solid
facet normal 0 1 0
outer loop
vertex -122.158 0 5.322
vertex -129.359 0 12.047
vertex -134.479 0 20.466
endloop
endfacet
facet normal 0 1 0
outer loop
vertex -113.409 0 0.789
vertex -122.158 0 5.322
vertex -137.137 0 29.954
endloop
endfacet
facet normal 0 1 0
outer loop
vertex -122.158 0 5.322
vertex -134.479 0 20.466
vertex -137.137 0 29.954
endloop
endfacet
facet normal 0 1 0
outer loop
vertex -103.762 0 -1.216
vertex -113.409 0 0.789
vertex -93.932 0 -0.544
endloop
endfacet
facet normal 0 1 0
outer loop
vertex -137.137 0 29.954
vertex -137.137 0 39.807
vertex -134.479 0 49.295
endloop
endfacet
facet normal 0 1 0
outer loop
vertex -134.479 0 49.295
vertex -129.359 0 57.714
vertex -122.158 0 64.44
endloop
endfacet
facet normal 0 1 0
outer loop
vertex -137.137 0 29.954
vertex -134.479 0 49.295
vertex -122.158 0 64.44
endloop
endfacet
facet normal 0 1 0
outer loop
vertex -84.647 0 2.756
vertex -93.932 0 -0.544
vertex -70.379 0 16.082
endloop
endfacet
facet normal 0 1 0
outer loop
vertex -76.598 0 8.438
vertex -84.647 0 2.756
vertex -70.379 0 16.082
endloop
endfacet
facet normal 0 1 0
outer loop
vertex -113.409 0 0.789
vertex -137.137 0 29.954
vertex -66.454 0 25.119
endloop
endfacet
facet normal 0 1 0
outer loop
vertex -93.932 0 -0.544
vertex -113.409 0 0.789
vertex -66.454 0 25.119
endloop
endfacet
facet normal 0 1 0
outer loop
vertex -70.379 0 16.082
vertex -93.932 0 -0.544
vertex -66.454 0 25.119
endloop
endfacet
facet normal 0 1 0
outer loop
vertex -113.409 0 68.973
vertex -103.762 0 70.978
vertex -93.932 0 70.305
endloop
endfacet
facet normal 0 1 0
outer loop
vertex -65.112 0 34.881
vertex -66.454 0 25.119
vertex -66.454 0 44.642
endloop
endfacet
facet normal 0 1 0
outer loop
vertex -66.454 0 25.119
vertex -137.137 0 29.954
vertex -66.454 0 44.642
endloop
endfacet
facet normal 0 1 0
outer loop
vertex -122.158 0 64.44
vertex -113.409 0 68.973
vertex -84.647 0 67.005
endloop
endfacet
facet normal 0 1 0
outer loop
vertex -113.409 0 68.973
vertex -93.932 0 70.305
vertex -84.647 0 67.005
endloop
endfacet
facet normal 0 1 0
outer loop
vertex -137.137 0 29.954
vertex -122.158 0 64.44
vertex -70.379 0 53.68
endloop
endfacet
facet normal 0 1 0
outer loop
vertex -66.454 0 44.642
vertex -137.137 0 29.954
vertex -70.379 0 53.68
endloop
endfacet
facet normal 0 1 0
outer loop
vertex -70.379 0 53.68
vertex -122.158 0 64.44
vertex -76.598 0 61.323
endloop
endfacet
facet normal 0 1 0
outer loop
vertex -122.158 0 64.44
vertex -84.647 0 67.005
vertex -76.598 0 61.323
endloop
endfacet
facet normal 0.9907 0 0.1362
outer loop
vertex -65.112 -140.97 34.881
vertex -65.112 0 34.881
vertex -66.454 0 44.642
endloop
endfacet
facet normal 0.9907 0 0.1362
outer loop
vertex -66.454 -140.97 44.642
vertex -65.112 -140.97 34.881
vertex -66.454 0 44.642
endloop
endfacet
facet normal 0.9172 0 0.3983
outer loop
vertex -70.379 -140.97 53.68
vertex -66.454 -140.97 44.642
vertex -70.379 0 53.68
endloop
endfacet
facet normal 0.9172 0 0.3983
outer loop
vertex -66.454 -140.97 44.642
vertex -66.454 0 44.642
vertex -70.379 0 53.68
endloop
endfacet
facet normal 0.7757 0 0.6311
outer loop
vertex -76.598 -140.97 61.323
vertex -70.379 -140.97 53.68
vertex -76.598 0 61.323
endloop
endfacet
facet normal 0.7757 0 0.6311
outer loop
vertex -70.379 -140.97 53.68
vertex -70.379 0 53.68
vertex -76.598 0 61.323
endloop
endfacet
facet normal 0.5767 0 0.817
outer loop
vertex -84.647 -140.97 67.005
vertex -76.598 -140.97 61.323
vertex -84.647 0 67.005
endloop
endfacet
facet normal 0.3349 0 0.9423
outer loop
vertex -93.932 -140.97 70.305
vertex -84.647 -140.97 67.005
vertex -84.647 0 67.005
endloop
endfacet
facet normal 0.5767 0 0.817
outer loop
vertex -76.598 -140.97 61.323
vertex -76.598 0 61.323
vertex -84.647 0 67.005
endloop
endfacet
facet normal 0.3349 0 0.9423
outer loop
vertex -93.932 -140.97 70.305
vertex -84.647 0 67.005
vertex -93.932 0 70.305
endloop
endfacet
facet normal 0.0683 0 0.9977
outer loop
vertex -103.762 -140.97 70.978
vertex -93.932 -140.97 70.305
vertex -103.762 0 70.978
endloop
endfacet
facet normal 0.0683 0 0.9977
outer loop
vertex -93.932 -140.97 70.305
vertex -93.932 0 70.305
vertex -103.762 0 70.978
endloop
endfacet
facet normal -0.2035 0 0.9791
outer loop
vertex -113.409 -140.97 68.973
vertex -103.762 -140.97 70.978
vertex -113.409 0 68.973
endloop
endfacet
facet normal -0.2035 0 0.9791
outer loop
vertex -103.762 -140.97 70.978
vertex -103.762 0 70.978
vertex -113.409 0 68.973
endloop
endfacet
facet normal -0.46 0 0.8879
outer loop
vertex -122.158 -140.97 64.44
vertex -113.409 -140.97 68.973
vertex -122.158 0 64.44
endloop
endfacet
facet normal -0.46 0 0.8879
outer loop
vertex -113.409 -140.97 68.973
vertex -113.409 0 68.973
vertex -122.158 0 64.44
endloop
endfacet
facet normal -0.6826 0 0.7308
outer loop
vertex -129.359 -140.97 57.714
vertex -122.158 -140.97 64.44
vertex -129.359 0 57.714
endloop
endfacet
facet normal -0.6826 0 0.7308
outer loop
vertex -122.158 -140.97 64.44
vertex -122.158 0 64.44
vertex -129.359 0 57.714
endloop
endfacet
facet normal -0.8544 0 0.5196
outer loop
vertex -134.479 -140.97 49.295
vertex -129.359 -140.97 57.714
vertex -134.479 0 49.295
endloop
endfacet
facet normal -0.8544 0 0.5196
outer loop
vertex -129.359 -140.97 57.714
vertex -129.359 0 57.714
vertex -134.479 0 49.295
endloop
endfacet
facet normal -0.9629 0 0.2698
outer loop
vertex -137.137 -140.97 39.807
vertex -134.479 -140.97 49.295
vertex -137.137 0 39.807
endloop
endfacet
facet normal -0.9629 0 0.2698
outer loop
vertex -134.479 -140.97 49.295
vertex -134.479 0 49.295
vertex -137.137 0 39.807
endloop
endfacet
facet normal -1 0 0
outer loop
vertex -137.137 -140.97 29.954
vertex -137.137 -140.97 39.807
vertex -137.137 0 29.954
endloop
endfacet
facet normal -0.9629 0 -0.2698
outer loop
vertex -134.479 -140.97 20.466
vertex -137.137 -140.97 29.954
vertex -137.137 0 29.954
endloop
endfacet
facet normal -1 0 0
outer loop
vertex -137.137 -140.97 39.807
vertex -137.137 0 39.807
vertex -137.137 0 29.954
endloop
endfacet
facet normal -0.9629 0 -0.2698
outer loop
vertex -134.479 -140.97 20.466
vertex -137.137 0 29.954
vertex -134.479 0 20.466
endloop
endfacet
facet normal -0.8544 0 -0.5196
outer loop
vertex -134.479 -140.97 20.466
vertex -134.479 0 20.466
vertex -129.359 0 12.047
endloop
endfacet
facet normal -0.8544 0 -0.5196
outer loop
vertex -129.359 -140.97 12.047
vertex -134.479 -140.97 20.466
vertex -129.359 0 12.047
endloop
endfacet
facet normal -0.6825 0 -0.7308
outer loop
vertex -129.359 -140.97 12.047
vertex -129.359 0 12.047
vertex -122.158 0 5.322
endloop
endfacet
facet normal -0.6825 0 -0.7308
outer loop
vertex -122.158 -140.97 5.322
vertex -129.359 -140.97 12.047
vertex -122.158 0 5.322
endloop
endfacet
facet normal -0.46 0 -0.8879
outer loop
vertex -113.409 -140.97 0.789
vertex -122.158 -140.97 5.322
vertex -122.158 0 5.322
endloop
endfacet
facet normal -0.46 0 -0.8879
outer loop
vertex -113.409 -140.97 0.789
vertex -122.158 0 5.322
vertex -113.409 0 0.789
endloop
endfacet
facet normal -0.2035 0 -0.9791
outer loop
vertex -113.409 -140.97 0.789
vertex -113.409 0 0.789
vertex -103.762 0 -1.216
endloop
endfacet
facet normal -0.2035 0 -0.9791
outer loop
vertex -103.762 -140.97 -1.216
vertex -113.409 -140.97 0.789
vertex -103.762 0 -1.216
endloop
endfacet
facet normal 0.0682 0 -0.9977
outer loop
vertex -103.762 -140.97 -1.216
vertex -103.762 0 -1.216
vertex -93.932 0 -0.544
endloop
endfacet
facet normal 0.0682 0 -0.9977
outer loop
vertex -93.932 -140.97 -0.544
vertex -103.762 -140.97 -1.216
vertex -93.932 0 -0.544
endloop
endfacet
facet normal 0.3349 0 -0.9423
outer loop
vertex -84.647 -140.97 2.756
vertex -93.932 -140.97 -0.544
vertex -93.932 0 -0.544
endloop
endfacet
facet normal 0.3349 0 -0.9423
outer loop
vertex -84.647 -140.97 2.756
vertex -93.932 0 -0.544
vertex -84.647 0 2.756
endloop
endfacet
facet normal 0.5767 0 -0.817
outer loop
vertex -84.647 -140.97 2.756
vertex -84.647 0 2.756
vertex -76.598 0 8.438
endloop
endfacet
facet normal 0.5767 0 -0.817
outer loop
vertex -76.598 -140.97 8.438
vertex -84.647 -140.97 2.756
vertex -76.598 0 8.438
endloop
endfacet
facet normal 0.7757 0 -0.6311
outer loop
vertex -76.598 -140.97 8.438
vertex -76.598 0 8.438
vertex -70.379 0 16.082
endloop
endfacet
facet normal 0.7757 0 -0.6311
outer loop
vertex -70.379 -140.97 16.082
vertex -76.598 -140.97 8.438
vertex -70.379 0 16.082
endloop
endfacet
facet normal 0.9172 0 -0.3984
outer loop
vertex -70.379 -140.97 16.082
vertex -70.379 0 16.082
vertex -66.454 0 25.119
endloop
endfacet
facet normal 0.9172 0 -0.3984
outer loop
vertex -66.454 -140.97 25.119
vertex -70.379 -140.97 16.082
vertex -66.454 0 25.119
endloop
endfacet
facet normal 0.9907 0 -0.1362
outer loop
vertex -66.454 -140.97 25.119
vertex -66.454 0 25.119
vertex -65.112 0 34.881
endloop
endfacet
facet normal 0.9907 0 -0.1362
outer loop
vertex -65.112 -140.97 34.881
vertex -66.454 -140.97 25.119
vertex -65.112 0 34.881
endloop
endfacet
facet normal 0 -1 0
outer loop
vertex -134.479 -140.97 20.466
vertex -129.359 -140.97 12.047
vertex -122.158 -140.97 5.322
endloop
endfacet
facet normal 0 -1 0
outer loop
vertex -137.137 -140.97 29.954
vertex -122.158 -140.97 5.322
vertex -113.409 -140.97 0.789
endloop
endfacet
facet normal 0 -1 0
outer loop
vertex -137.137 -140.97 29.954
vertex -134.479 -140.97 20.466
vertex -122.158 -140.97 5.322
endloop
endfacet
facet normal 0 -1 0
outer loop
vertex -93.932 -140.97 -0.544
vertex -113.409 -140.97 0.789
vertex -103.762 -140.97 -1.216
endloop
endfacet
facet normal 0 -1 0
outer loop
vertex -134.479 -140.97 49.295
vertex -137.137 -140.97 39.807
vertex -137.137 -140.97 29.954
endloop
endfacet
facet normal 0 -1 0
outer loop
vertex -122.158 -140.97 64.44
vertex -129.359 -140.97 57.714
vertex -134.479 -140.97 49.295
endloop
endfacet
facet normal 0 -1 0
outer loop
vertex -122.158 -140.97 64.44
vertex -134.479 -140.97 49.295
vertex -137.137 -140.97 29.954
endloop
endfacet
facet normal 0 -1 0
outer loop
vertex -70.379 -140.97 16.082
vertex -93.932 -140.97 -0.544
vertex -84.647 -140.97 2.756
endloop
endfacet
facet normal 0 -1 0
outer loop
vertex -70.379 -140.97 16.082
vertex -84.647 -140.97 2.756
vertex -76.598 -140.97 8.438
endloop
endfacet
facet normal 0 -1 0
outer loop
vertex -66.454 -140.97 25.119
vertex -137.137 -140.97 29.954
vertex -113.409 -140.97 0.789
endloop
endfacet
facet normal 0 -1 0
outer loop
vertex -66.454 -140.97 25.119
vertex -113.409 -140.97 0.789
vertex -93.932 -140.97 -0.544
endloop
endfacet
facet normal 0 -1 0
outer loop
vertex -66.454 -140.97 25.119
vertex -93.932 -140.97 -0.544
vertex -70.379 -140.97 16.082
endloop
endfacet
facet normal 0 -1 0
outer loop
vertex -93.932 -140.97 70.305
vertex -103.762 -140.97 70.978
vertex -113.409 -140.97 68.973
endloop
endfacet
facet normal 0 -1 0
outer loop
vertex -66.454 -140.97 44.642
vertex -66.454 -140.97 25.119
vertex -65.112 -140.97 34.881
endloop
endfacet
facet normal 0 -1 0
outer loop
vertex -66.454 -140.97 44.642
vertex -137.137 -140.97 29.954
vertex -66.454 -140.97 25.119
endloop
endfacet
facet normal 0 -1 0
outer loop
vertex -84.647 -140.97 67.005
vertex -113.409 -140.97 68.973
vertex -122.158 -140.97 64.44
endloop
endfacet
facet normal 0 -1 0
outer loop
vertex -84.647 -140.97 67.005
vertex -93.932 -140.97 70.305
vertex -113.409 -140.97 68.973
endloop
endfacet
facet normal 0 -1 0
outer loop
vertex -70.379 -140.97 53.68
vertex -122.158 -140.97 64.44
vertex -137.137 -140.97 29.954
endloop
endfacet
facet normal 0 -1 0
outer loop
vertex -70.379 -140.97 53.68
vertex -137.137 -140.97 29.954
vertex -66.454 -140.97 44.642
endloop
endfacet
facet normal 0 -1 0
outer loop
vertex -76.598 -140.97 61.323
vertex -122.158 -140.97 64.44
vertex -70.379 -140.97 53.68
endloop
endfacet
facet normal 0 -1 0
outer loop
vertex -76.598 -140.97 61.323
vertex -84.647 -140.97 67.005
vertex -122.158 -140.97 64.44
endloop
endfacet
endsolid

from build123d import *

# Parameters (mm, degrees)
F0_R     = 36.1810919244
F1_DEPTH = 25.4
F2_DEPTH = 25.4
F3_DEPTH = 90.17


with BuildPart() as f1:
    # F0 (on Front) → F1 (new body)
    with BuildSketch(Plane.XZ):
        with Locations((-101.2930572033, 34.8807759583)):
            Circle(F0_R)
    extrude(amount=F1_DEPTH)

    # F2 (add): faces of the model
    f2_faces = [f1.faces().sort_by_distance(p)[0] for p in [
        (-101.2930572033, -25.4, 34.8807759583),
        (-101.2930572033, 0, 34.8807759583),
    ]]
    extrude(f2_faces, amount=F2_DEPTH, dir=(0, -1, 0))

    # F3 (add): faces of the model
    f3_faces = [f1.faces().sort_by_distance(p)[0] for p in [
        (-101.2930572033, -50.8, 34.8807759583),
        (-101.2930572033, 0, 34.8807759583),
    ]]
    extrude(f3_faces, amount=F3_DEPTH, dir=(0, -1, 0))


solid = f1.part
